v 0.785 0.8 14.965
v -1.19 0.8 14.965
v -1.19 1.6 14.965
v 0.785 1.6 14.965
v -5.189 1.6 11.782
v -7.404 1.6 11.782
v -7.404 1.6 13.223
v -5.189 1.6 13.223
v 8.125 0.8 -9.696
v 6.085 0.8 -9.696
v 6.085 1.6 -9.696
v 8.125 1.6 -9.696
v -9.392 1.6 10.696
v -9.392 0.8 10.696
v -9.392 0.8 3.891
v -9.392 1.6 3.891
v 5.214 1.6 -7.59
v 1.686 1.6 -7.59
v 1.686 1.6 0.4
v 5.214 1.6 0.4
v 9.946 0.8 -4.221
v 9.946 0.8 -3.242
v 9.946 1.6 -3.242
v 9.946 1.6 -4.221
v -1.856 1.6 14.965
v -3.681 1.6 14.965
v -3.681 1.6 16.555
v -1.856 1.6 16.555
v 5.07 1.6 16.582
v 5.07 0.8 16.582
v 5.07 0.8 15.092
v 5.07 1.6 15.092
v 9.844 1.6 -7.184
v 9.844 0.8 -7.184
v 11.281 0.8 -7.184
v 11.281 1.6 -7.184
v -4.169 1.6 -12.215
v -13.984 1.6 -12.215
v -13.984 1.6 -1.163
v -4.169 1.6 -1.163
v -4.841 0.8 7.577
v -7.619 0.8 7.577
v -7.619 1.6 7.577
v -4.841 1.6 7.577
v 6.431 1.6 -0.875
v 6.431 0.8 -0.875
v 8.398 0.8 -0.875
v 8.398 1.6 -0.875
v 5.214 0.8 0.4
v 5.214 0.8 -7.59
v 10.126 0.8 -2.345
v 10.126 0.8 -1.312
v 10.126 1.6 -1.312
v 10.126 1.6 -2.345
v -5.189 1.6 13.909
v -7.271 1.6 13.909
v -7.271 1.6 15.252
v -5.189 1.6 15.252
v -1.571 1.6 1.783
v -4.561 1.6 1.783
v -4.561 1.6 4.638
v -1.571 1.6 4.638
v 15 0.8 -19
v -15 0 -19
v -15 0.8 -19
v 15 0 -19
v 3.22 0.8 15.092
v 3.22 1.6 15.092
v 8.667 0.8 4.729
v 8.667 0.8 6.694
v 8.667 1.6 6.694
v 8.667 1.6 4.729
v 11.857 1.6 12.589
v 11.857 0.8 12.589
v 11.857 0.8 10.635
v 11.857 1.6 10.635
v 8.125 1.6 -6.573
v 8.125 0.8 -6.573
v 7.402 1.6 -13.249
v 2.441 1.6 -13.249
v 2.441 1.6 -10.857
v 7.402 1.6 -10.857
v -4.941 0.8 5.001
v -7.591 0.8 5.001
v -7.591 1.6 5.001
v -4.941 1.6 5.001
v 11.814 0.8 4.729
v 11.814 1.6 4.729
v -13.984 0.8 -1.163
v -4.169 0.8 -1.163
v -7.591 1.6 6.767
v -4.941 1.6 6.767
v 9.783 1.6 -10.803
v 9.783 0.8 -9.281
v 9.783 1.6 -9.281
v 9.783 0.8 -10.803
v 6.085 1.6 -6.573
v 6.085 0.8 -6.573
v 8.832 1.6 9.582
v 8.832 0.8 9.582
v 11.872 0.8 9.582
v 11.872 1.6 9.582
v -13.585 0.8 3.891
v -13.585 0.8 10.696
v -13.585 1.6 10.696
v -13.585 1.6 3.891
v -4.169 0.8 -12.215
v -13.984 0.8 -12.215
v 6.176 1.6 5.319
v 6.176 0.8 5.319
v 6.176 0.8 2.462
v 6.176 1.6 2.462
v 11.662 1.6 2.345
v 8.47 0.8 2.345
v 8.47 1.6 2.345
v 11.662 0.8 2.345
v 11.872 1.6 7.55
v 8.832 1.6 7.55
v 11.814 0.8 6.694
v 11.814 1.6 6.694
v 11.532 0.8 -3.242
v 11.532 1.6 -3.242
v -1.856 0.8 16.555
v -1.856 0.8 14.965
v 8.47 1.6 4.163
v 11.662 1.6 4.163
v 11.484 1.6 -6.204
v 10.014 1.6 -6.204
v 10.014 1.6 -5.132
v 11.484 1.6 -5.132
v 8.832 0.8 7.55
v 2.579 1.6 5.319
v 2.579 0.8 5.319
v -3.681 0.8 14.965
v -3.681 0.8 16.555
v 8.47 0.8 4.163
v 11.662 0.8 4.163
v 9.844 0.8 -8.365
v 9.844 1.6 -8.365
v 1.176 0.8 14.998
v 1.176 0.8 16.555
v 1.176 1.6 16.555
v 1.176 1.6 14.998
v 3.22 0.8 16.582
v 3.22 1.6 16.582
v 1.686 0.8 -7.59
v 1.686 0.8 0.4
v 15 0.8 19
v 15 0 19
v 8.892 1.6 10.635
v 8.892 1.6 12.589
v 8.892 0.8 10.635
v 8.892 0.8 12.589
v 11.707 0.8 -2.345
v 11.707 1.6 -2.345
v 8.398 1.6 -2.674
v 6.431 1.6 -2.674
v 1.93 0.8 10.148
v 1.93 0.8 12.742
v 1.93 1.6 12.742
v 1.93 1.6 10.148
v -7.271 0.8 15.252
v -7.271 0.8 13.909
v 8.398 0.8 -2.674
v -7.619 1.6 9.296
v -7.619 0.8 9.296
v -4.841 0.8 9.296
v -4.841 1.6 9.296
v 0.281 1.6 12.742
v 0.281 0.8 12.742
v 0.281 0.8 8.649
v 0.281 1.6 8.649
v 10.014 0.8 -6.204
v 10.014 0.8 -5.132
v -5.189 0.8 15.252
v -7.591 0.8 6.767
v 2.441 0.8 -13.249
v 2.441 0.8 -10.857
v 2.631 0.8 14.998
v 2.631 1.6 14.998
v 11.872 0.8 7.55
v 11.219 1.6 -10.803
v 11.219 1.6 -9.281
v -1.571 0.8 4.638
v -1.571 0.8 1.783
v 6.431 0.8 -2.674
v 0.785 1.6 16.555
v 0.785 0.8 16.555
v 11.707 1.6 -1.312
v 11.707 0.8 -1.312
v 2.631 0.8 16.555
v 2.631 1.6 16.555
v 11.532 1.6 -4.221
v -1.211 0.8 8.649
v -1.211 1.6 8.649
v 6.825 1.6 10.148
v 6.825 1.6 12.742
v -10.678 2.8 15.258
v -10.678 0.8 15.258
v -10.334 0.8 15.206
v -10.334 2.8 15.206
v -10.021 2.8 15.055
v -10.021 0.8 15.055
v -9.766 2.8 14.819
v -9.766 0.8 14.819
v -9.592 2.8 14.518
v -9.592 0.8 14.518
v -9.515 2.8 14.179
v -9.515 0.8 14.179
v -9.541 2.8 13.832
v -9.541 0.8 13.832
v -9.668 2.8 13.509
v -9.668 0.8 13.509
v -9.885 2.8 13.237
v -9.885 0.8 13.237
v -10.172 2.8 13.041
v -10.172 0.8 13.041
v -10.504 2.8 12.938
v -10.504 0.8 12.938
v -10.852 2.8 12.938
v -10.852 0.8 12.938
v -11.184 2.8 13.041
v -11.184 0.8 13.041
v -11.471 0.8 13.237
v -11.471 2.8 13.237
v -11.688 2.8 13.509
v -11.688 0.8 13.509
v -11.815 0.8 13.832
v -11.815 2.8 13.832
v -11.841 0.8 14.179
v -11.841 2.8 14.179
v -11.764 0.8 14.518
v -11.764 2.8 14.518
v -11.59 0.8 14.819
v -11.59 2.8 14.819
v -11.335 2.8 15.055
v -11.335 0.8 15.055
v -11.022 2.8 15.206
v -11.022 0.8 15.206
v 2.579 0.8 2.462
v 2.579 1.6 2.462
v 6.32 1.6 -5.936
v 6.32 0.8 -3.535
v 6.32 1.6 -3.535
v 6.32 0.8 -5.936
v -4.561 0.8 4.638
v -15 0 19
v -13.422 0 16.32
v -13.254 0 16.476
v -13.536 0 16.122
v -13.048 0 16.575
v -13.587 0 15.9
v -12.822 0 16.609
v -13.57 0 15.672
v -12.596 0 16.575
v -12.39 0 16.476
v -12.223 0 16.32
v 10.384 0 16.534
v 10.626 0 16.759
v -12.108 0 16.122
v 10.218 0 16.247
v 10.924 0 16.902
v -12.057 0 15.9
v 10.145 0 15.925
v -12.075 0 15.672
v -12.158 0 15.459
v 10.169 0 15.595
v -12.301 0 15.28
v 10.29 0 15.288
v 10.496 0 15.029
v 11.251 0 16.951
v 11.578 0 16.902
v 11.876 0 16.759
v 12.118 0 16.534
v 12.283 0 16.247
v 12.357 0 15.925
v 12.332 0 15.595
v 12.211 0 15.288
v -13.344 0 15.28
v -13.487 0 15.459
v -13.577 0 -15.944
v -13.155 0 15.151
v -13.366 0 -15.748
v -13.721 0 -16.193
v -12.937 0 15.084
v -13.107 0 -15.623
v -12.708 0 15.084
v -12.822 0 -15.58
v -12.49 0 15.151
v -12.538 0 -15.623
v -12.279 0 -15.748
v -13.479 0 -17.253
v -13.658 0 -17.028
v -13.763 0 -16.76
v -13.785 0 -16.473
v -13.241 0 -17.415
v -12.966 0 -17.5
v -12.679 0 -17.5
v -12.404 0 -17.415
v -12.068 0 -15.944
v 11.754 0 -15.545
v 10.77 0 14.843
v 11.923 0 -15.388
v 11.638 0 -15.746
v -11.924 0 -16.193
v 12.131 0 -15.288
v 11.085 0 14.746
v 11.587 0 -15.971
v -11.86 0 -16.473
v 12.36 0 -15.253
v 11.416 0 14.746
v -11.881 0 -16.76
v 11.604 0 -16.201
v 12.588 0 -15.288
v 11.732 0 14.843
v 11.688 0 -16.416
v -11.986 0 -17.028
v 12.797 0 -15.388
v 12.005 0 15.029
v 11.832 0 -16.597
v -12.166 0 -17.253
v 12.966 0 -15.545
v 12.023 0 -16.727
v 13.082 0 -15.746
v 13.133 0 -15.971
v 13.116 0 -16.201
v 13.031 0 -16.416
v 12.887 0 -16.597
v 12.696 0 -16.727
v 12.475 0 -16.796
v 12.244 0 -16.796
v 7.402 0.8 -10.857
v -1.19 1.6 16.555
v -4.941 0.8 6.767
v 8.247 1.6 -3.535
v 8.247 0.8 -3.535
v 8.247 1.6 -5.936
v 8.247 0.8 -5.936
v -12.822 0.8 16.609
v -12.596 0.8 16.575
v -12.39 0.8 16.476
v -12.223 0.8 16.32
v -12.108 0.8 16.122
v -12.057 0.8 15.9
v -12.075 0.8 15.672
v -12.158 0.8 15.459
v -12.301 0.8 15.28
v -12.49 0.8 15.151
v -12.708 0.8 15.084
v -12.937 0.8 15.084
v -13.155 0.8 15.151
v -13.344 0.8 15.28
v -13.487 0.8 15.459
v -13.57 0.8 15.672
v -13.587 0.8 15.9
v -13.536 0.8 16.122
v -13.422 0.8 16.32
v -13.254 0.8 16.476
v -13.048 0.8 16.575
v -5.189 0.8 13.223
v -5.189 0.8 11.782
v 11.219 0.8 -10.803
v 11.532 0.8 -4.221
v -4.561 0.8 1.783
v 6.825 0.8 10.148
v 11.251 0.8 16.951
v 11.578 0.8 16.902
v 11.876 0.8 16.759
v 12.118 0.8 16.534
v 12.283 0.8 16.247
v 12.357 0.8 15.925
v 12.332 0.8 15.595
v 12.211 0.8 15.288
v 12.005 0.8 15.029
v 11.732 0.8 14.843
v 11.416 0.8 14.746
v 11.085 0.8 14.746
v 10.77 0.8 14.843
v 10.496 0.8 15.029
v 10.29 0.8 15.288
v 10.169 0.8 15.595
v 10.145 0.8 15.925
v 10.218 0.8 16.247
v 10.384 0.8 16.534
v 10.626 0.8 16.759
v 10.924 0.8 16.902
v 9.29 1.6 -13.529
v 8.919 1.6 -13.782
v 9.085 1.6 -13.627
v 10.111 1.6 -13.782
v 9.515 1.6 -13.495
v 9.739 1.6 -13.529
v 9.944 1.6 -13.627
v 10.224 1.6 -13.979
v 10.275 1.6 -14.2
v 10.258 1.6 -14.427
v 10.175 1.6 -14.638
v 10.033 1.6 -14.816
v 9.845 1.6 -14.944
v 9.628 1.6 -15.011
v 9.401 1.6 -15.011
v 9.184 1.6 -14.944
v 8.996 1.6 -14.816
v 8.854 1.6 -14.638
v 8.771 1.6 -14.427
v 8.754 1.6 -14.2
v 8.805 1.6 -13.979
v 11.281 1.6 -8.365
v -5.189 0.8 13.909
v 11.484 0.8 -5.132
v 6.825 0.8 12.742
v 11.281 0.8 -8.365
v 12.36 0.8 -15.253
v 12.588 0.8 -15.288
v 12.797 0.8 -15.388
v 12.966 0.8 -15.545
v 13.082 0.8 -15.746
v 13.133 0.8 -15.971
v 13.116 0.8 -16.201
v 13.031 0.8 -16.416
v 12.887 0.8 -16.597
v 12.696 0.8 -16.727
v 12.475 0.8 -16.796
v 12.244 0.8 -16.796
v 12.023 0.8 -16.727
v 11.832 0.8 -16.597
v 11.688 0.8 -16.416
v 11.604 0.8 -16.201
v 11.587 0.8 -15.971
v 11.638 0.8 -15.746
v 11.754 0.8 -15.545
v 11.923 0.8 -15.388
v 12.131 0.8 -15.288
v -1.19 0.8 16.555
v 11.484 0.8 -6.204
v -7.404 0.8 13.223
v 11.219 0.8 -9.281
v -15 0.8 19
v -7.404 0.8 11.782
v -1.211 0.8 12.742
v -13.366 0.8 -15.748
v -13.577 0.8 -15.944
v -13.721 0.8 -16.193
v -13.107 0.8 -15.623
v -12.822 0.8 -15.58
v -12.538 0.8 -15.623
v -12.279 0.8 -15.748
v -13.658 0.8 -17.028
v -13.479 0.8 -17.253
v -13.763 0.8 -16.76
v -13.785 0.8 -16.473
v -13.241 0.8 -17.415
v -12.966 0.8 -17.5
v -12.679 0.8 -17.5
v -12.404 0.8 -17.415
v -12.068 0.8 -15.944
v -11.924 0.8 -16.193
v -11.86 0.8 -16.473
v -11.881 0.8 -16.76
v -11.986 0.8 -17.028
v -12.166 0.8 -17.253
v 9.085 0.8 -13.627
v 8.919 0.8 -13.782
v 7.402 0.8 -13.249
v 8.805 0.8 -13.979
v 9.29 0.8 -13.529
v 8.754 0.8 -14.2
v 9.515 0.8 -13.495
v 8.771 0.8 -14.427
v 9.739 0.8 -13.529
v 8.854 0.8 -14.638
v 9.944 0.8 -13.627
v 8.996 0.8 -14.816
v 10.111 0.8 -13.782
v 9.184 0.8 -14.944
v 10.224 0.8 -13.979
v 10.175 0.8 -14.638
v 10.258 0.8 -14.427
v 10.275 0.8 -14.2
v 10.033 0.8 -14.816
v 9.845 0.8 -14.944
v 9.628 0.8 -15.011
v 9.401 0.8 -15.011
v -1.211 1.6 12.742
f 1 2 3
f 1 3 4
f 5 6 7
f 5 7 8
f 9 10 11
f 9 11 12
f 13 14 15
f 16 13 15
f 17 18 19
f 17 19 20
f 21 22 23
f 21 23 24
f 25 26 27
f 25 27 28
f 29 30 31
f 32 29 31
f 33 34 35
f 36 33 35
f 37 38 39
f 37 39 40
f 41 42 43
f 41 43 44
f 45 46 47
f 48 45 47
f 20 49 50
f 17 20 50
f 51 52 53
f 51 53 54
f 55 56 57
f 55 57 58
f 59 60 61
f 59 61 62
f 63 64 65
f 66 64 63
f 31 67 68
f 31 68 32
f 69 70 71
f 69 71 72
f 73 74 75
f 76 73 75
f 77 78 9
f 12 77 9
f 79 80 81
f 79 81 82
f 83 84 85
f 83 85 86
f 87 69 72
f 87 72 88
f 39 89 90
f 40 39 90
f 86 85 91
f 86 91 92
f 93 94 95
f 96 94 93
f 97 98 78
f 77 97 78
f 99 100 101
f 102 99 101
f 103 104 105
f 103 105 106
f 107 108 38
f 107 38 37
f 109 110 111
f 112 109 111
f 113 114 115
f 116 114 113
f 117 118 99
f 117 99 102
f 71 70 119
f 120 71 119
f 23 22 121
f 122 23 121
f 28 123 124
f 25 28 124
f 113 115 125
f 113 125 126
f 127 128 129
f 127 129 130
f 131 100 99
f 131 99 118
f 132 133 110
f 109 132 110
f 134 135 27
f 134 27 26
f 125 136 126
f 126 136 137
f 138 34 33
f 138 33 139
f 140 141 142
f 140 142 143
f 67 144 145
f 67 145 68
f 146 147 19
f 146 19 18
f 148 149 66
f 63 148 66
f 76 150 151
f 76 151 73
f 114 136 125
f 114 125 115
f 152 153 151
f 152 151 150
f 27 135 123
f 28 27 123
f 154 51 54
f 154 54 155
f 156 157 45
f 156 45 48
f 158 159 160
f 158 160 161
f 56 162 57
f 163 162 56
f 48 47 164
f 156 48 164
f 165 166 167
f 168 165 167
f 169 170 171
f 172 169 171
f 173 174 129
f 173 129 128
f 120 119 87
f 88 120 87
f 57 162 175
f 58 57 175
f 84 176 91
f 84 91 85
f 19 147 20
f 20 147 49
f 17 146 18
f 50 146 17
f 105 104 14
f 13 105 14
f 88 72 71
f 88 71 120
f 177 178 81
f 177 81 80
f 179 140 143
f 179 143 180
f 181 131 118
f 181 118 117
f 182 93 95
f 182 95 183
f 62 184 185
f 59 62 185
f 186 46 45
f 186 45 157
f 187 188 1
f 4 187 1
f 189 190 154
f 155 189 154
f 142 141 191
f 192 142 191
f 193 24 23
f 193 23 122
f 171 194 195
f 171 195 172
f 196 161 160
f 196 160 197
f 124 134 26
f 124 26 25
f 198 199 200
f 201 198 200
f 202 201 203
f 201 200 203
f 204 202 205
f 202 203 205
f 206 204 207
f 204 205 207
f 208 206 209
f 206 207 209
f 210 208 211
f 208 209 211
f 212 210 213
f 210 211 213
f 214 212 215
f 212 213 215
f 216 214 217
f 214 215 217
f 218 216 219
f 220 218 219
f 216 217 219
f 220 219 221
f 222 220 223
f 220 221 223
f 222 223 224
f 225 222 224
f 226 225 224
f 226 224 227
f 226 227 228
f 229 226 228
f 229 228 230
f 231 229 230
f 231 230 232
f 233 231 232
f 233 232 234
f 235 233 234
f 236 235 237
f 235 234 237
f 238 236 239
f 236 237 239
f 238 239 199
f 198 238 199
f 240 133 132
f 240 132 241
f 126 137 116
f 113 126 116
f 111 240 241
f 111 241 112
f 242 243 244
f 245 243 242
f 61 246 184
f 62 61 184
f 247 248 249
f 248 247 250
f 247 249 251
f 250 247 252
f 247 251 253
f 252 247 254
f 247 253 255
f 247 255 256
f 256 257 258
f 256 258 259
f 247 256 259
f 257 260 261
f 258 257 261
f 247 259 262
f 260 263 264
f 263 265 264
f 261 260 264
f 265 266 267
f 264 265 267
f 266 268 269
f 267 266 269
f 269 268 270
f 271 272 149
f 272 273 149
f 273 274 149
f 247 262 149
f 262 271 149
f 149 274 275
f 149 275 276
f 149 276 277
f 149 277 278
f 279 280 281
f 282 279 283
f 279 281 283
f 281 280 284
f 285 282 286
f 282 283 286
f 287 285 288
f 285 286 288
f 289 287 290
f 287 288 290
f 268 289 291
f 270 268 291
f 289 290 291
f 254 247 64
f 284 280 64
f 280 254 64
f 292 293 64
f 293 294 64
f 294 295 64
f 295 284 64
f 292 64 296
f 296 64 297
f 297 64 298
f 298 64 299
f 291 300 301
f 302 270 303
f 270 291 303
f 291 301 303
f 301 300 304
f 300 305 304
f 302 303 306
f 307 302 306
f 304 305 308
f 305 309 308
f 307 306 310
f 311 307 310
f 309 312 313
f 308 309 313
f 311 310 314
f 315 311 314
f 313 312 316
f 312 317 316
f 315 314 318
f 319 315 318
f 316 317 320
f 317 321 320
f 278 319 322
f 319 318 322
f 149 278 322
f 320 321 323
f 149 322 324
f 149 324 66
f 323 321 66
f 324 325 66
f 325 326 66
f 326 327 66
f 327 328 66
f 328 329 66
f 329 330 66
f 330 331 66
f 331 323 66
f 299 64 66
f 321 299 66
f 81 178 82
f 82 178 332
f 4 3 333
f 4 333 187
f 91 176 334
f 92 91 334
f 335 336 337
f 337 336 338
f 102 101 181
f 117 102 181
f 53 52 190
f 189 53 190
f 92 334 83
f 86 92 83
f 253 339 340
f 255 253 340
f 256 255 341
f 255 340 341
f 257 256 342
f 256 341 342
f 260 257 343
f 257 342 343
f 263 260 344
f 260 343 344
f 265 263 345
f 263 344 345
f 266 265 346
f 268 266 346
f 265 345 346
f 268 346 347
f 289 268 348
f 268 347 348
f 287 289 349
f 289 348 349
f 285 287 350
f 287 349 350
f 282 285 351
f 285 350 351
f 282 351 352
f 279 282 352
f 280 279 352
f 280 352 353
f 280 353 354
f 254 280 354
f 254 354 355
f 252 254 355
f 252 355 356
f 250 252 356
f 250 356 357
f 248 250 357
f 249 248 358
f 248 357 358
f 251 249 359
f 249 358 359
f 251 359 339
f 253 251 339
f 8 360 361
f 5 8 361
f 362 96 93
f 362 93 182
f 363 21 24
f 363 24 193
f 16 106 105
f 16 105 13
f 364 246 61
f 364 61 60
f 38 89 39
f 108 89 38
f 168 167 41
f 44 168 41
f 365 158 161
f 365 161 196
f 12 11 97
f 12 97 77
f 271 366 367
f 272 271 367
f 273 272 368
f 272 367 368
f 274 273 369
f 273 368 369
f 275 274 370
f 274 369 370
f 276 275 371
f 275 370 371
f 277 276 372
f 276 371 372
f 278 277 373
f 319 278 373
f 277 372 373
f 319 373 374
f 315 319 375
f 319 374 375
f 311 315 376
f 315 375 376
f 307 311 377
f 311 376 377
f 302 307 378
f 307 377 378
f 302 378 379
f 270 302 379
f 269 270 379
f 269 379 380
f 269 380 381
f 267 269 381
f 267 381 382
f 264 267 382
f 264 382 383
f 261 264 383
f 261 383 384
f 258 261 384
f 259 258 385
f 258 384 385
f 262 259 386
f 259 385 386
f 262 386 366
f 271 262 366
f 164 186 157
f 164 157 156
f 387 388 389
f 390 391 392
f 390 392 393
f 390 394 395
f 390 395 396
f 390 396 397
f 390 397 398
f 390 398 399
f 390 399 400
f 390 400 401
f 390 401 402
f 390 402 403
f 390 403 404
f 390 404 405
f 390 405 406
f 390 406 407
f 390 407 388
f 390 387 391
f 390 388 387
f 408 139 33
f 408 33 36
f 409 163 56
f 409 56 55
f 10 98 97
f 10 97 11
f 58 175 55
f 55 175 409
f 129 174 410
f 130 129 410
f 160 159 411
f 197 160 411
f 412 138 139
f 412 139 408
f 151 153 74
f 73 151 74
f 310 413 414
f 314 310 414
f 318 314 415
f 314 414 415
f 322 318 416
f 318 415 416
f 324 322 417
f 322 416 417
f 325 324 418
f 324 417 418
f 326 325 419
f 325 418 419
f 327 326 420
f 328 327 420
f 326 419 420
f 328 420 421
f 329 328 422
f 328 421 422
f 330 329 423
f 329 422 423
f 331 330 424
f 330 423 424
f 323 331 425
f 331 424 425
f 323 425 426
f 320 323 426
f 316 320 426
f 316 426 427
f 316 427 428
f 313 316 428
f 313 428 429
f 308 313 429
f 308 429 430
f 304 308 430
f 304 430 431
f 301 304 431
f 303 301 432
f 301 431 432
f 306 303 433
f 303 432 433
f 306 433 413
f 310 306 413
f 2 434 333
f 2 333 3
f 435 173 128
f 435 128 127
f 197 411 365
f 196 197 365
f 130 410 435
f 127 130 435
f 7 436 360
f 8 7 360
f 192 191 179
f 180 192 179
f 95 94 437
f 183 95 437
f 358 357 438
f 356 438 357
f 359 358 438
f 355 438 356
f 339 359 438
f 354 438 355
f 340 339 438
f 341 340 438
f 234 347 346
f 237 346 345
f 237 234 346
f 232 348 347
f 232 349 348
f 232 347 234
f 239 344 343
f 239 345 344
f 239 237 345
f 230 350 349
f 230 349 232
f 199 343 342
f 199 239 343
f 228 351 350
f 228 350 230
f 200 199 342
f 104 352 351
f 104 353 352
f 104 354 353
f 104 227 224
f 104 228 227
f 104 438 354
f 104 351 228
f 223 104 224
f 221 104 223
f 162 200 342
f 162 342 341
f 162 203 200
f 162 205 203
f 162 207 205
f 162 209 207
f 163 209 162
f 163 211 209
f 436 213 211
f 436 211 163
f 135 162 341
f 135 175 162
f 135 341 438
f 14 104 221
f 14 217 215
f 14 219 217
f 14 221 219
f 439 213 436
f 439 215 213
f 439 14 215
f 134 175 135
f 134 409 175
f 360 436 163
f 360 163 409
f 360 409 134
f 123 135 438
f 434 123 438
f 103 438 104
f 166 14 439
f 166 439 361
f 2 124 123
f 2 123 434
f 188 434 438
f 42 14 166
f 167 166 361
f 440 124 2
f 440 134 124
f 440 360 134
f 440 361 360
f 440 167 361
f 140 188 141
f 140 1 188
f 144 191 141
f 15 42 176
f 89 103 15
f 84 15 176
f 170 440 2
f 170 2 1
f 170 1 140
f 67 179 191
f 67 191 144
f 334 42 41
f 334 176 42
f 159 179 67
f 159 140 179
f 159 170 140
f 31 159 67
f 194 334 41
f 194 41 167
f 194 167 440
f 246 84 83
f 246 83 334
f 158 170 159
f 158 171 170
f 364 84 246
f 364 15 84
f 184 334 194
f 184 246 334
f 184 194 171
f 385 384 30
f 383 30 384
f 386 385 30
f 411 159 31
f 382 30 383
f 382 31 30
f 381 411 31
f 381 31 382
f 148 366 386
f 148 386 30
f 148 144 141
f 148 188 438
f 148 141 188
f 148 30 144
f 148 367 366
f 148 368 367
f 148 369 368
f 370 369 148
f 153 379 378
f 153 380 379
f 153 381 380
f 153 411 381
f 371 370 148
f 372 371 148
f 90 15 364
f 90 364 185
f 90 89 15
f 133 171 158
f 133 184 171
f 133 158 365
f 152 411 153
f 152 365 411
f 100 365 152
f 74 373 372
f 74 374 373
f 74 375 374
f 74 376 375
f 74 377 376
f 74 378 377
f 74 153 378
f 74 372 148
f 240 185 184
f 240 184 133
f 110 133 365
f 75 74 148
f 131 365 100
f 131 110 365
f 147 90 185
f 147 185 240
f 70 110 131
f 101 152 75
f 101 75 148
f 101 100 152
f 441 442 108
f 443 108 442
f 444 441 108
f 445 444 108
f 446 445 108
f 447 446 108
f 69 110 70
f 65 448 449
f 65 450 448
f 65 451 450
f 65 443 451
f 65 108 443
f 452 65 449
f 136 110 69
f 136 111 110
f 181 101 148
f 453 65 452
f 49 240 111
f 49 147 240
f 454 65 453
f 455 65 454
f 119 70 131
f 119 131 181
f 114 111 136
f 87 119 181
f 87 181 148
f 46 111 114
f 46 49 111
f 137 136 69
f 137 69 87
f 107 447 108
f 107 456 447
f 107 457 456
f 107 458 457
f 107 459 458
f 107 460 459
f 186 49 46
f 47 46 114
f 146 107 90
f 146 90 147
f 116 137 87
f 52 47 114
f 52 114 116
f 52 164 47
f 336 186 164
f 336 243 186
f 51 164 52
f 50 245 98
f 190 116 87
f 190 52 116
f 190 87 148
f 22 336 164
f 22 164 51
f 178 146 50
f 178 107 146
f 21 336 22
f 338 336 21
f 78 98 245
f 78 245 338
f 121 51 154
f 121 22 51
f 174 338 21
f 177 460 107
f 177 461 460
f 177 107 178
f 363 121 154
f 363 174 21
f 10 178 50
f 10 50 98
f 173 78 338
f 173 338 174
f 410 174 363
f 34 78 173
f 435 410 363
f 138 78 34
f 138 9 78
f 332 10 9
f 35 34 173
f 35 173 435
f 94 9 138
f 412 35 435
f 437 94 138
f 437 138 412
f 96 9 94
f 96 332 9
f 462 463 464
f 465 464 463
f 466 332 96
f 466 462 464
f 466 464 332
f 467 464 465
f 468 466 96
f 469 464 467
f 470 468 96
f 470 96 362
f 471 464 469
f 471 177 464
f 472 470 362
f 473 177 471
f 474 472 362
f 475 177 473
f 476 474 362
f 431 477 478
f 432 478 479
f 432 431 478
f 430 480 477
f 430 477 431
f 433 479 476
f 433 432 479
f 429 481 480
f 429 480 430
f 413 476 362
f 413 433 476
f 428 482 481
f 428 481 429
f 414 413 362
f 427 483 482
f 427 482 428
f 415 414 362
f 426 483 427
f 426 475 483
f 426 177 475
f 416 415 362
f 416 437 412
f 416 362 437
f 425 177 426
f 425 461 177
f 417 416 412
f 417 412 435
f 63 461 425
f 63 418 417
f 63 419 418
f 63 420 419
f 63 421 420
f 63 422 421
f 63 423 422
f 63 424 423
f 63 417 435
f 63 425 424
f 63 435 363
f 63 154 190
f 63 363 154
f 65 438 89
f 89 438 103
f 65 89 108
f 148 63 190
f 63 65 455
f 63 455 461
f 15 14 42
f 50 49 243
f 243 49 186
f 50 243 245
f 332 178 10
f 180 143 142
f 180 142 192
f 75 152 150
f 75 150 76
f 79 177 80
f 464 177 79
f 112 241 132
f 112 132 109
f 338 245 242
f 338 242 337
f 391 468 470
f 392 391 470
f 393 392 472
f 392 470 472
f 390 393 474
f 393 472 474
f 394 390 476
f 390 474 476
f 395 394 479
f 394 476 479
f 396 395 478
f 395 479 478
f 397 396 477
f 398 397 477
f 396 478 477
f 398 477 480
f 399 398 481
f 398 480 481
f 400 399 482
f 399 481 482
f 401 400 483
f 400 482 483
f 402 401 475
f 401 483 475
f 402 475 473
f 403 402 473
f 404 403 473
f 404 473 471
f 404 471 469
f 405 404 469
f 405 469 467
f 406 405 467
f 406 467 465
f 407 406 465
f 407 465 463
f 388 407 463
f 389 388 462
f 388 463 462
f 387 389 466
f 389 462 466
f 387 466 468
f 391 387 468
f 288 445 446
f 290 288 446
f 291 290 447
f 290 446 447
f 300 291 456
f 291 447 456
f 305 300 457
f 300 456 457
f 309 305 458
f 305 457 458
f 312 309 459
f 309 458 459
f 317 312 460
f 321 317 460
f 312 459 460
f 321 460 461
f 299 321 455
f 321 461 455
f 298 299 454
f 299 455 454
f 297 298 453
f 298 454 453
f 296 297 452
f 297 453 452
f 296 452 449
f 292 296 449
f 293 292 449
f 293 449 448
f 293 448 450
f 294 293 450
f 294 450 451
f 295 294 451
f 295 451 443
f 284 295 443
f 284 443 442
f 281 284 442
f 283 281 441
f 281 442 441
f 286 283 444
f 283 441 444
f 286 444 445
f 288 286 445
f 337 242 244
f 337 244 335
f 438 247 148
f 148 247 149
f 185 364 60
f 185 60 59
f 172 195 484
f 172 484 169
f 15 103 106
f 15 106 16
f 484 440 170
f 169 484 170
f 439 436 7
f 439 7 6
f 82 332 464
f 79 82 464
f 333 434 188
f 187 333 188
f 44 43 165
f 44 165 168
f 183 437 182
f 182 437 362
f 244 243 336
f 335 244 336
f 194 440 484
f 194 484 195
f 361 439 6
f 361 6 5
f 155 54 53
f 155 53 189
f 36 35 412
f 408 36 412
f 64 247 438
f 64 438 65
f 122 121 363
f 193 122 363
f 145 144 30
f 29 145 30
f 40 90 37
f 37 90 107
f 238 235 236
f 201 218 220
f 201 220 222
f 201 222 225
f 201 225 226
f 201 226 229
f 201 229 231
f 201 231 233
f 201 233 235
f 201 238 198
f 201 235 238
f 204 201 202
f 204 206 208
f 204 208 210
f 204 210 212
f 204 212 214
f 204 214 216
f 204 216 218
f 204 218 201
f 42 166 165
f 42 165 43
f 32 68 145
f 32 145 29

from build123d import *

# Parameters (mm, degrees)
SKETCH1_W           = 30
SKETCH1_H           = 38
BOSS_EXTRUDE1_DEPTH = 0.8
SKETCH2_R           = 1.109088316
SKETCH2_R_2         = 0.767029383
SKETCH2_R_3         = 0.775376329
SKETCH2_R_4         = 0.965264576
CUT_EXTRUDE1_DEPTH  = 0.8
SKETCH3_R           = 0.762390383
SKETCH3_W           = 4.894784697
SKETCH3_H           = 2.593636899
SKETCH3_W_2         = 4.192792091
SKETCH3_H_2         = 6.804733529
SKETCH3_W_3         = 3.597522217
SKETCH3_H_3         = 2.857060704
SKETCH3_W_4         = 3.52833422
SKETCH3_H_4         = 7.990285999
SKETCH3_W_5         = 4.960404455
SKETCH3_H_5         = 2.392024826
SKETCH3_W_6         = 2.649975693
SKETCH3_H_6         = 1.766675078
SKETCH3_W_7         = 2.778355341
SKETCH3_H_7         = 1.719515045
SKETCH3_W_8         = 1.492224114
SKETCH3_H_8         = 4.092690132
SKETCH3_W_9         = 2.214520185
SKETCH3_H_9         = 1.440440718
SKETCH3_W_10        = 2.082297707
SKETCH3_H_10        = 1.343633444
SKETCH3_W_11        = 2.964936673
SKETCH3_H_11        = 1.954523976
SKETCH3_W_12        = 3.040001034
SKETCH3_H_12        = 2.031411973
SKETCH3_W_13        = 3.147081738
SKETCH3_H_13        = 1.964784153
SKETCH3_W_14        = 3.191518467
SKETCH3_H_14        = 1.818199508
SKETCH3_W_15        = 1.580834587
SKETCH3_H_15        = 1.033148902
SKETCH3_W_16        = 1.585712642
SKETCH3_H_16        = 0.978957998
SKETCH3_W_17        = 1.469355228
SKETCH3_H_17        = 1.07248279
SKETCH3_W_18        = 1.436511349
SKETCH3_H_18        = 1.181213981
SKETCH3_W_19        = 1.43651135
SKETCH3_H_19        = 1.521795272
SKETCH3_W_20        = 9.81533928
SKETCH3_H_20        = 11.052195098
BOSS_EXTRUDE2_DEPTH = 0.8
SKETCH4_W           = 1.825068619
SKETCH4_H           = 1.589839684
SKETCH4_W_2         = 1.975600159
SKETCH4_W_3         = 1.455054018
SKETCH4_H_2         = 1.55750712
SKETCH4_W_4         = 1.850712573
SKETCH4_H_3         = 1.49055505
SKETCH4_W_5         = 1.966905423
SKETCH4_H_4         = 1.798635407
SKETCH4_W_6         = 1.927265264
SKETCH4_H_5         = 2.401166398
SKETCH4_W_7         = 2.040835962
SKETCH4_H_6         = 3.123215429
SKETCH4_W_8         = 2.990312219
SKETCH4_H_7         = 2.85468568
BOSS_EXTRUDE3_DEPTH = 0.8
SKETCH5_R           = 1.166233651
BOSS_EXTRUDE4_DEPTH = 2


with BuildPart() as part:
    # Sketch1 → Boss-Extrude1 (new body)
    with BuildSketch(Plane(origin=(0, 0, 0), x_dir=(1, 0, 0), z_dir=(0, 1, 0))):
        Rectangle(SKETCH1_W, SKETCH1_H)
    extrude(amount=BOSS_EXTRUDE1_DEPTH)

    # Sketch2 → Cut-Extrude1 (cut)
    with BuildSketch(Plane(origin=(0, 0.8, 0), x_dir=(1, 0, 0), z_dir=(0, 1, 0))):
        with Locations(Location((11.250748943, -15.842220292, 0), (0, 0, 270))):
            Circle(SKETCH2_R)
        with Locations(Location((-12.822379124, -15.842220292, 0), (0, 0, 270))):
            Circle(SKETCH2_R_2)
        with Locations(Location((12.359837258, 16.028797503, 0), (0, 0, 270))):
            Circle(SKETCH2_R_3)
        with Locations(Location((-12.822379124, 16.54551038, 0), (0, 0, 270))):
            Circle(SKETCH2_R_4)
    extrude(amount=-CUT_EXTRUDE1_DEPTH, mode=Mode.SUBTRACT)

    # Sketch3 → Boss-Extrude2 (add)
    with BuildSketch(Plane(origin=(0, 0.8, 0), x_dir=(1, 0, 0), z_dir=(0, 1, 0))):
        with Locations(Location((9.514606687, 14.257204648, 0), (0, 0, 270))):
            Circle(SKETCH3_R)
        with Locations((4.377365901, -11.445055136)):
            Rectangle(SKETCH3_W, SKETCH3_H)
        with Locations((-11.488143819, -7.293161754)):
            Rectangle(SKETCH3_W_2, SKETCH3_H_2)
        with Locations((4.377365901, -3.89079499)):
            Rectangle(SKETCH3_W_3, SKETCH3_H_3)
        with Locations((3.450098414, 3.595282667)):
            Rectangle(SKETCH3_W_4, SKETCH3_H_4)
        with Locations((4.921355444, 12.052974346)):
            Rectangle(SKETCH3_W_5, SKETCH3_H_5)
        with Locations((-6.265733234, -5.883849823)):
            Rectangle(SKETCH3_W_6, SKETCH3_H_6)
        with Locations((-6.230165426, -8.436309488)):
            Rectangle(SKETCH3_W_7, SKETCH3_H_7)
        with Locations((-0.464784197, -10.695528519)):
            Rectangle(SKETCH3_W_8, SKETCH3_H_8)
        with Locations((-6.296276665, -12.502715855)):
            Rectangle(SKETCH3_W_9, SKETCH3_H_9)
        with Locations((-6.230165426, -14.58062451)):
            Rectangle(SKETCH3_W_10, SKETCH3_H_10)
        with Locations((10.3743464, -11.611945846)):
            Rectangle(SKETCH3_W_11, SKETCH3_H_11)
        with Locations((10.351951393, -8.565924221)):
            Rectangle(SKETCH3_W_12, SKETCH3_H_12)
        with Locations((10.240052284, -5.711675816)):
            Rectangle(SKETCH3_W_13, SKETCH3_H_13)
        with Locations((10.066157491, -3.254157356)):
            Rectangle(SKETCH3_W_14, SKETCH3_H_14)
        with Locations((10.916850927, 1.828837055)):
            Rectangle(SKETCH3_W_15, SKETCH3_H_15)
        with Locations((10.739321253, 3.731847337)):
            Rectangle(SKETCH3_W_16, SKETCH3_H_16)
        with Locations((10.748827302, 5.668032924)):
            Rectangle(SKETCH3_W_17, SKETCH3_H_17)
        with Locations((10.56243198, 7.774708171)):
            Rectangle(SKETCH3_W_18, SKETCH3_H_18)
        with Locations((10.500800241, 10.042163174)):
            Rectangle(SKETCH3_W_19, SKETCH3_H_19)
        with Locations((-9.076372897, 6.688794027)):
            Rectangle(SKETCH3_W_20, SKETCH3_H_20)
    extrude(amount=BOSS_EXTRUDE2_DEPTH)

    # Sketch4 → Boss-Extrude3 (add)
    with BuildSketch(Plane(origin=(0, 0.8, 0), x_dir=(1, 0, 0), z_dir=(0, 1, 0))):
        with Locations((-2.768458169, -15.760115658)):
            Rectangle(SKETCH4_W, SKETCH4_H)
        with Locations((-0.202584614, -15.760115658)):
            Rectangle(SKETCH4_W_2, SKETCH4_H)
        with Locations((1.903702303, -15.77628194)):
            Rectangle(SKETCH4_W_3, SKETCH4_H_2)
        with Locations((4.144992677, -15.837154802)):
            Rectangle(SKETCH4_W_4, SKETCH4_H_3)
        with Locations((7.414099695, 1.774450018)):
            Rectangle(SKETCH4_W_5, SKETCH4_H_4)
        with Locations((7.283749146, 4.735498446)):
            Rectangle(SKETCH4_W_6, SKETCH4_H_5)
        with Locations((7.104971851, 8.134512532)):
            Rectangle(SKETCH4_W_7, SKETCH4_H_6)
        with Locations((-3.066161458, -3.210239912)):
            Rectangle(SKETCH4_W_8, SKETCH4_H_7)
    extrude(amount=BOSS_EXTRUDE3_DEPTH)

    # Sketch5 → Boss-Extrude4 (add)
    with BuildSketch(Plane(origin=(0, 0.8, 0), x_dir=(1, 0, 0), z_dir=(0, 1, 0))):
        with Locations(Location((-10.677990128, -14.091680692, 0), (0, 0, 270))):
            Circle(SKETCH5_R)
    extrude(amount=BOSS_EXTRUDE4_DEPTH)


solid = part.part
